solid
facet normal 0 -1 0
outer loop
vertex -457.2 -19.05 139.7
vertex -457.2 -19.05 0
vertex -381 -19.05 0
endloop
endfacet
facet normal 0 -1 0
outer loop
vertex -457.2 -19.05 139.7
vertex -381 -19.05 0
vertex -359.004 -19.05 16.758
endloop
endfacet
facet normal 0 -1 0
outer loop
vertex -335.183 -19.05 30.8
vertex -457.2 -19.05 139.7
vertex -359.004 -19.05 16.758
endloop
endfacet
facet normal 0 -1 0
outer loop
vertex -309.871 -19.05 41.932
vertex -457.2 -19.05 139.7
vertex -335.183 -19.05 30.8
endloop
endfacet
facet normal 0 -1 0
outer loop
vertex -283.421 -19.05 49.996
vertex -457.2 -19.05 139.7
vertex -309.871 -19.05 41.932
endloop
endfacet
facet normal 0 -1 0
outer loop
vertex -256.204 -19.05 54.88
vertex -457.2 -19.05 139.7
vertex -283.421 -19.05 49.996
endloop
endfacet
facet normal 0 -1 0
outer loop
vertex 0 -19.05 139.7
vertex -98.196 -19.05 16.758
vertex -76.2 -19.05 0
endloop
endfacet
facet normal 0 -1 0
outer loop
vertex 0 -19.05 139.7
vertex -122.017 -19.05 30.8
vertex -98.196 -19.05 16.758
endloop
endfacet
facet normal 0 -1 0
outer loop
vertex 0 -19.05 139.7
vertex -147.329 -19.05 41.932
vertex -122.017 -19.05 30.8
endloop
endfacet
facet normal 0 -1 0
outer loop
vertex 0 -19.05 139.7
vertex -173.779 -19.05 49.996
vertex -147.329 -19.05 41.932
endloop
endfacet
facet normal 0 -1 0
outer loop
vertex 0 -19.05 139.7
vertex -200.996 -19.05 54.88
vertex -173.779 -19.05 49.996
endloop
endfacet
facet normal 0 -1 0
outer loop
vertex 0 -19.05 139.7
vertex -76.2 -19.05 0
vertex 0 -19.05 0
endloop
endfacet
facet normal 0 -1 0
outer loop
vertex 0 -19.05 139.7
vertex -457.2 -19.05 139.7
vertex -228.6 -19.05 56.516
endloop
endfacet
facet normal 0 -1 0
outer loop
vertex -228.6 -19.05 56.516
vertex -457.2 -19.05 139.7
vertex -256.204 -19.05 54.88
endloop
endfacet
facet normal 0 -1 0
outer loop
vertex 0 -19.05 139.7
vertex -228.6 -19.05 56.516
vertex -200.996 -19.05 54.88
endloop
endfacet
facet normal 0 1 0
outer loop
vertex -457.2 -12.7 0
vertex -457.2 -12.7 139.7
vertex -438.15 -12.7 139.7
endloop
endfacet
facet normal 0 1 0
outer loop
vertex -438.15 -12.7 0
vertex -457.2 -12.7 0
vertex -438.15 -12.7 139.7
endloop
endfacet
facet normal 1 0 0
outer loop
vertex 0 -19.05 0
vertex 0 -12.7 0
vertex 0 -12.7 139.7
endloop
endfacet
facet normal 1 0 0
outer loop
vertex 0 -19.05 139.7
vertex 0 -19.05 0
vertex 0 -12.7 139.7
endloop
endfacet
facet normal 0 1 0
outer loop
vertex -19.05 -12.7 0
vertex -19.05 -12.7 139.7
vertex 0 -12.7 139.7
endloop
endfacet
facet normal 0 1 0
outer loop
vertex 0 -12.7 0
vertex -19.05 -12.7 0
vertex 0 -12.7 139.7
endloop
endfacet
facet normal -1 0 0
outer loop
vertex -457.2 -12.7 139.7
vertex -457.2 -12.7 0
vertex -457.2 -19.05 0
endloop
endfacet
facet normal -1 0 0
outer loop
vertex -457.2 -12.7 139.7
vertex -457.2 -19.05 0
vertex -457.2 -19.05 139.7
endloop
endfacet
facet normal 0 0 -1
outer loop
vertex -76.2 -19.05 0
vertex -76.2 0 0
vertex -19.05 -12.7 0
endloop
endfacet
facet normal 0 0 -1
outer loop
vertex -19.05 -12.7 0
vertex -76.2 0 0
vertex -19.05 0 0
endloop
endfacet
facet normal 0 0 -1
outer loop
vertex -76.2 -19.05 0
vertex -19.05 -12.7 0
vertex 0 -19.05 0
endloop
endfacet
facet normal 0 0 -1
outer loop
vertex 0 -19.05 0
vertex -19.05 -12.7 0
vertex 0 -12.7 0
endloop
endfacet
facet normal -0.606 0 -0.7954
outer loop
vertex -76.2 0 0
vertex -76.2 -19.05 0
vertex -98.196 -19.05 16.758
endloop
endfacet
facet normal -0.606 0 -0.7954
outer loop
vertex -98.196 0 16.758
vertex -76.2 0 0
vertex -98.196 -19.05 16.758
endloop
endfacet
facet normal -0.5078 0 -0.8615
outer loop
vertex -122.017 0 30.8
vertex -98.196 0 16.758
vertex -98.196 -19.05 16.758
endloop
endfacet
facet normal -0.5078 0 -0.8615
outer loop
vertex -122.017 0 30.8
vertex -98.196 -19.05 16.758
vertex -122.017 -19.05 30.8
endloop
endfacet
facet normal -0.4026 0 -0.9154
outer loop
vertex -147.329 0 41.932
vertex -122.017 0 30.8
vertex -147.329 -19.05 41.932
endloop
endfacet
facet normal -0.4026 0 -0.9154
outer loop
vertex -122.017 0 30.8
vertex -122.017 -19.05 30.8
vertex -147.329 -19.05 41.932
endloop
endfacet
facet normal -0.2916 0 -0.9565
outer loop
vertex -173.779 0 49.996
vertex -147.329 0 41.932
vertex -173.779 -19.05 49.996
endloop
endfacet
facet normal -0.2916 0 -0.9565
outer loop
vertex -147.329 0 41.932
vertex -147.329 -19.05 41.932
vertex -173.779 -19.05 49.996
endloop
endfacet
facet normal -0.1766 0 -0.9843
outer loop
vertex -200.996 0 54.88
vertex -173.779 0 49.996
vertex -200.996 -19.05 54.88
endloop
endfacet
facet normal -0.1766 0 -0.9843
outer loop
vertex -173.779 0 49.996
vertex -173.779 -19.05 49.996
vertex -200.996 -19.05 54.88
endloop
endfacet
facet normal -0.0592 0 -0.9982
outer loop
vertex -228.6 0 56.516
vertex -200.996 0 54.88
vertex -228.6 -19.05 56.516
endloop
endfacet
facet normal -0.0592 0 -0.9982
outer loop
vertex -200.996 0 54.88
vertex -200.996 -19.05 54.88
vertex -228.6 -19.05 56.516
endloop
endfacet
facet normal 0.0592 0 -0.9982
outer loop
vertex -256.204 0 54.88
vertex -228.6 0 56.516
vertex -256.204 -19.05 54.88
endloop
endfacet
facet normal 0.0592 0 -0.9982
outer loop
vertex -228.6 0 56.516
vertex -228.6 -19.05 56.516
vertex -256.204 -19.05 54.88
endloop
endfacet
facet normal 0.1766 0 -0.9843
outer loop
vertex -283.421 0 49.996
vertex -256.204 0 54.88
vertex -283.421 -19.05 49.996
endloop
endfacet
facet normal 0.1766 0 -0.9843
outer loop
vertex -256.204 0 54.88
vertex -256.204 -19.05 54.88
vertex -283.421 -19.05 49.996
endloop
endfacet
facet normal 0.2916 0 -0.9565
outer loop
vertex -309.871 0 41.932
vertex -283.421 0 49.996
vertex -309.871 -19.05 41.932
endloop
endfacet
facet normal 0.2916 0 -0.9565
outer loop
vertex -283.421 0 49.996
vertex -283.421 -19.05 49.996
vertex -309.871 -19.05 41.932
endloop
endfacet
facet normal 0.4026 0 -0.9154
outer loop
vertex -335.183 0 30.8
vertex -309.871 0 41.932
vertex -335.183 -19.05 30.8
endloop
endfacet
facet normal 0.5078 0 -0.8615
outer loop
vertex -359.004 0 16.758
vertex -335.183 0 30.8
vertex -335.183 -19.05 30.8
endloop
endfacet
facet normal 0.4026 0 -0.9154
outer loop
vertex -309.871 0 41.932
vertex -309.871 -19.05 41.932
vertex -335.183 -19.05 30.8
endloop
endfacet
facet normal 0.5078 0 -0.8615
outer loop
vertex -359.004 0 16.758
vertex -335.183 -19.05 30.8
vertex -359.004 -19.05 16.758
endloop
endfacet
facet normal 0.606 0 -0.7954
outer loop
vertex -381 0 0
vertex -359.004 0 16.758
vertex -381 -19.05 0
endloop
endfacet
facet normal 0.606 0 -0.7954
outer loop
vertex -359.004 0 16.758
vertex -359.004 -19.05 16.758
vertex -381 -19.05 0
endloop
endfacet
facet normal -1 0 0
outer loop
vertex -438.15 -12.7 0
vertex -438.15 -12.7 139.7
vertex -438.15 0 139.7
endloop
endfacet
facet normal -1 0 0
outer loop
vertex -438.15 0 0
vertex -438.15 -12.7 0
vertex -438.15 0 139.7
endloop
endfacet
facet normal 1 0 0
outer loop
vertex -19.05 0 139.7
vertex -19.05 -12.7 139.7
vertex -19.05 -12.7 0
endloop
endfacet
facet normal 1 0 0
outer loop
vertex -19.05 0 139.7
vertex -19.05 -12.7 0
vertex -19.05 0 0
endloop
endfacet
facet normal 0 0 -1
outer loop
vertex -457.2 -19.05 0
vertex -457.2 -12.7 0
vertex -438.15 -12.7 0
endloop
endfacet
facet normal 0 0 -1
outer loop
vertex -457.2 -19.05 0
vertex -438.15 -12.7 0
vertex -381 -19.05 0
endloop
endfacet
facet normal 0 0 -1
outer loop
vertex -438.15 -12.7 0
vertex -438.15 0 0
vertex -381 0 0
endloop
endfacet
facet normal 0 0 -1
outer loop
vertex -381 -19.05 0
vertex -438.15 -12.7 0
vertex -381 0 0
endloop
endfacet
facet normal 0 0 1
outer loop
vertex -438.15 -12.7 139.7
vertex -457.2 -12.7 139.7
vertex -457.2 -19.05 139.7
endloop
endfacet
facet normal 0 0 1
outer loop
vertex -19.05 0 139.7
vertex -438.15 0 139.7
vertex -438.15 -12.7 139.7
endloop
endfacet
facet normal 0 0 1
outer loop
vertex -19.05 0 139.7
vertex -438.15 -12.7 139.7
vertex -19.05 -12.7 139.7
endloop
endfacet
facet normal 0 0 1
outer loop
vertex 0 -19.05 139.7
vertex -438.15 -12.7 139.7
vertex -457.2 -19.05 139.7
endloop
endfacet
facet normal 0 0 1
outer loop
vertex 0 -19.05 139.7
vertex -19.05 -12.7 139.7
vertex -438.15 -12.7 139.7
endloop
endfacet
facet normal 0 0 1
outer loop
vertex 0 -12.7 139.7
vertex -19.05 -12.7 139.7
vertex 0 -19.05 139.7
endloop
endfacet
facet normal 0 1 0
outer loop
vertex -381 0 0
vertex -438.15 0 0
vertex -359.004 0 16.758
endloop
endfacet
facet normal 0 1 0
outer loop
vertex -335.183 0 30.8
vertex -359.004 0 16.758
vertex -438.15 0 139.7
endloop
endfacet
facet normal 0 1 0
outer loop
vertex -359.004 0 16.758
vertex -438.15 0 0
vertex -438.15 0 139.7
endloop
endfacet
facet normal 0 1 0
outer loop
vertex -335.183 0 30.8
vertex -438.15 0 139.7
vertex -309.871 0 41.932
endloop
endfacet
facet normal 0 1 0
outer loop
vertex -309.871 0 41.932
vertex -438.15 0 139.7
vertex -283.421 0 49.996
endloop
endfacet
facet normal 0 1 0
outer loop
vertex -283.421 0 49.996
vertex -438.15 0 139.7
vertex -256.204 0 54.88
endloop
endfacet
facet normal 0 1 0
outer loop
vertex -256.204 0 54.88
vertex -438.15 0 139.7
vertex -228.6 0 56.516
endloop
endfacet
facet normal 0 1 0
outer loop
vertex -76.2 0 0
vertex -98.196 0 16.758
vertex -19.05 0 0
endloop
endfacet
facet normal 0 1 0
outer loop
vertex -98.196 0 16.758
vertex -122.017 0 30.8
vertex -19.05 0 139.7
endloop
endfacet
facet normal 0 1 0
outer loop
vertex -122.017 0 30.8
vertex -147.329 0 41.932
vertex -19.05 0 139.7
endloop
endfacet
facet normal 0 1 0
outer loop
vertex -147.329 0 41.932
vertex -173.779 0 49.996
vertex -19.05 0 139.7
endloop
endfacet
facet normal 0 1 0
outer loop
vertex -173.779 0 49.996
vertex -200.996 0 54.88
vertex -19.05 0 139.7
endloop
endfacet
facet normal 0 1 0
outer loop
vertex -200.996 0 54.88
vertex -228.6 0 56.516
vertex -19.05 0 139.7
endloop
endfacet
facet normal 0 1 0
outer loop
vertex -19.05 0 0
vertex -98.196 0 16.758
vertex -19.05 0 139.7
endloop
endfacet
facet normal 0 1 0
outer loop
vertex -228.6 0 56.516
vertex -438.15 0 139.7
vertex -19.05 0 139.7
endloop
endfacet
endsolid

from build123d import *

# Parameters (mm, degrees)
F0_W     = 457.2
F0_H     = 139.7
F1_DEPTH = 19.05
F2_W     = 19.05
F2_H     = 12.7
F3_DEPTH = 139.701
F4_W     = 19.05
F4_H     = 12.7
F5_DEPTH = 139.701
F7_DEPTH = 19.051


with BuildPart() as f1:
    # F0 (on Front) → F1 (new body)
    with BuildSketch(Plane.XZ):
        with Locations((-228.6, 69.85)):
            Rectangle(F0_W, F0_H)
    extrude(amount=F1_DEPTH)

    # F2 (on face) → F3 (cut, through all)
    with BuildSketch(Plane.XY.offset(139.7)):
        with Locations((-9.525, -6.35)):
            Rectangle(F2_W, F2_H)
    extrude(amount=-F3_DEPTH, mode=Mode.SUBTRACT)

    # F4 (on face) → F5 (cut, through all)
    with BuildSketch(Plane.XY.offset(139.7)):
        with Locations((-447.675, -6.35)):
            Rectangle(F4_W, F4_H)
    extrude(amount=-F5_DEPTH, mode=Mode.SUBTRACT)

    # F6 (on face) → F7 (cut, through all)
    with BuildSketch(Plane.XZ.offset(19.05)):
        with BuildLine():
            Line((-381, 0), (-76.2, 0))
            ThreePointArc((-76.2, 0), (-228.6, 56.515785), (-381, 0))
        make_face()
    extrude(amount=-F7_DEPTH, mode=Mode.SUBTRACT)


solid = f1.part
